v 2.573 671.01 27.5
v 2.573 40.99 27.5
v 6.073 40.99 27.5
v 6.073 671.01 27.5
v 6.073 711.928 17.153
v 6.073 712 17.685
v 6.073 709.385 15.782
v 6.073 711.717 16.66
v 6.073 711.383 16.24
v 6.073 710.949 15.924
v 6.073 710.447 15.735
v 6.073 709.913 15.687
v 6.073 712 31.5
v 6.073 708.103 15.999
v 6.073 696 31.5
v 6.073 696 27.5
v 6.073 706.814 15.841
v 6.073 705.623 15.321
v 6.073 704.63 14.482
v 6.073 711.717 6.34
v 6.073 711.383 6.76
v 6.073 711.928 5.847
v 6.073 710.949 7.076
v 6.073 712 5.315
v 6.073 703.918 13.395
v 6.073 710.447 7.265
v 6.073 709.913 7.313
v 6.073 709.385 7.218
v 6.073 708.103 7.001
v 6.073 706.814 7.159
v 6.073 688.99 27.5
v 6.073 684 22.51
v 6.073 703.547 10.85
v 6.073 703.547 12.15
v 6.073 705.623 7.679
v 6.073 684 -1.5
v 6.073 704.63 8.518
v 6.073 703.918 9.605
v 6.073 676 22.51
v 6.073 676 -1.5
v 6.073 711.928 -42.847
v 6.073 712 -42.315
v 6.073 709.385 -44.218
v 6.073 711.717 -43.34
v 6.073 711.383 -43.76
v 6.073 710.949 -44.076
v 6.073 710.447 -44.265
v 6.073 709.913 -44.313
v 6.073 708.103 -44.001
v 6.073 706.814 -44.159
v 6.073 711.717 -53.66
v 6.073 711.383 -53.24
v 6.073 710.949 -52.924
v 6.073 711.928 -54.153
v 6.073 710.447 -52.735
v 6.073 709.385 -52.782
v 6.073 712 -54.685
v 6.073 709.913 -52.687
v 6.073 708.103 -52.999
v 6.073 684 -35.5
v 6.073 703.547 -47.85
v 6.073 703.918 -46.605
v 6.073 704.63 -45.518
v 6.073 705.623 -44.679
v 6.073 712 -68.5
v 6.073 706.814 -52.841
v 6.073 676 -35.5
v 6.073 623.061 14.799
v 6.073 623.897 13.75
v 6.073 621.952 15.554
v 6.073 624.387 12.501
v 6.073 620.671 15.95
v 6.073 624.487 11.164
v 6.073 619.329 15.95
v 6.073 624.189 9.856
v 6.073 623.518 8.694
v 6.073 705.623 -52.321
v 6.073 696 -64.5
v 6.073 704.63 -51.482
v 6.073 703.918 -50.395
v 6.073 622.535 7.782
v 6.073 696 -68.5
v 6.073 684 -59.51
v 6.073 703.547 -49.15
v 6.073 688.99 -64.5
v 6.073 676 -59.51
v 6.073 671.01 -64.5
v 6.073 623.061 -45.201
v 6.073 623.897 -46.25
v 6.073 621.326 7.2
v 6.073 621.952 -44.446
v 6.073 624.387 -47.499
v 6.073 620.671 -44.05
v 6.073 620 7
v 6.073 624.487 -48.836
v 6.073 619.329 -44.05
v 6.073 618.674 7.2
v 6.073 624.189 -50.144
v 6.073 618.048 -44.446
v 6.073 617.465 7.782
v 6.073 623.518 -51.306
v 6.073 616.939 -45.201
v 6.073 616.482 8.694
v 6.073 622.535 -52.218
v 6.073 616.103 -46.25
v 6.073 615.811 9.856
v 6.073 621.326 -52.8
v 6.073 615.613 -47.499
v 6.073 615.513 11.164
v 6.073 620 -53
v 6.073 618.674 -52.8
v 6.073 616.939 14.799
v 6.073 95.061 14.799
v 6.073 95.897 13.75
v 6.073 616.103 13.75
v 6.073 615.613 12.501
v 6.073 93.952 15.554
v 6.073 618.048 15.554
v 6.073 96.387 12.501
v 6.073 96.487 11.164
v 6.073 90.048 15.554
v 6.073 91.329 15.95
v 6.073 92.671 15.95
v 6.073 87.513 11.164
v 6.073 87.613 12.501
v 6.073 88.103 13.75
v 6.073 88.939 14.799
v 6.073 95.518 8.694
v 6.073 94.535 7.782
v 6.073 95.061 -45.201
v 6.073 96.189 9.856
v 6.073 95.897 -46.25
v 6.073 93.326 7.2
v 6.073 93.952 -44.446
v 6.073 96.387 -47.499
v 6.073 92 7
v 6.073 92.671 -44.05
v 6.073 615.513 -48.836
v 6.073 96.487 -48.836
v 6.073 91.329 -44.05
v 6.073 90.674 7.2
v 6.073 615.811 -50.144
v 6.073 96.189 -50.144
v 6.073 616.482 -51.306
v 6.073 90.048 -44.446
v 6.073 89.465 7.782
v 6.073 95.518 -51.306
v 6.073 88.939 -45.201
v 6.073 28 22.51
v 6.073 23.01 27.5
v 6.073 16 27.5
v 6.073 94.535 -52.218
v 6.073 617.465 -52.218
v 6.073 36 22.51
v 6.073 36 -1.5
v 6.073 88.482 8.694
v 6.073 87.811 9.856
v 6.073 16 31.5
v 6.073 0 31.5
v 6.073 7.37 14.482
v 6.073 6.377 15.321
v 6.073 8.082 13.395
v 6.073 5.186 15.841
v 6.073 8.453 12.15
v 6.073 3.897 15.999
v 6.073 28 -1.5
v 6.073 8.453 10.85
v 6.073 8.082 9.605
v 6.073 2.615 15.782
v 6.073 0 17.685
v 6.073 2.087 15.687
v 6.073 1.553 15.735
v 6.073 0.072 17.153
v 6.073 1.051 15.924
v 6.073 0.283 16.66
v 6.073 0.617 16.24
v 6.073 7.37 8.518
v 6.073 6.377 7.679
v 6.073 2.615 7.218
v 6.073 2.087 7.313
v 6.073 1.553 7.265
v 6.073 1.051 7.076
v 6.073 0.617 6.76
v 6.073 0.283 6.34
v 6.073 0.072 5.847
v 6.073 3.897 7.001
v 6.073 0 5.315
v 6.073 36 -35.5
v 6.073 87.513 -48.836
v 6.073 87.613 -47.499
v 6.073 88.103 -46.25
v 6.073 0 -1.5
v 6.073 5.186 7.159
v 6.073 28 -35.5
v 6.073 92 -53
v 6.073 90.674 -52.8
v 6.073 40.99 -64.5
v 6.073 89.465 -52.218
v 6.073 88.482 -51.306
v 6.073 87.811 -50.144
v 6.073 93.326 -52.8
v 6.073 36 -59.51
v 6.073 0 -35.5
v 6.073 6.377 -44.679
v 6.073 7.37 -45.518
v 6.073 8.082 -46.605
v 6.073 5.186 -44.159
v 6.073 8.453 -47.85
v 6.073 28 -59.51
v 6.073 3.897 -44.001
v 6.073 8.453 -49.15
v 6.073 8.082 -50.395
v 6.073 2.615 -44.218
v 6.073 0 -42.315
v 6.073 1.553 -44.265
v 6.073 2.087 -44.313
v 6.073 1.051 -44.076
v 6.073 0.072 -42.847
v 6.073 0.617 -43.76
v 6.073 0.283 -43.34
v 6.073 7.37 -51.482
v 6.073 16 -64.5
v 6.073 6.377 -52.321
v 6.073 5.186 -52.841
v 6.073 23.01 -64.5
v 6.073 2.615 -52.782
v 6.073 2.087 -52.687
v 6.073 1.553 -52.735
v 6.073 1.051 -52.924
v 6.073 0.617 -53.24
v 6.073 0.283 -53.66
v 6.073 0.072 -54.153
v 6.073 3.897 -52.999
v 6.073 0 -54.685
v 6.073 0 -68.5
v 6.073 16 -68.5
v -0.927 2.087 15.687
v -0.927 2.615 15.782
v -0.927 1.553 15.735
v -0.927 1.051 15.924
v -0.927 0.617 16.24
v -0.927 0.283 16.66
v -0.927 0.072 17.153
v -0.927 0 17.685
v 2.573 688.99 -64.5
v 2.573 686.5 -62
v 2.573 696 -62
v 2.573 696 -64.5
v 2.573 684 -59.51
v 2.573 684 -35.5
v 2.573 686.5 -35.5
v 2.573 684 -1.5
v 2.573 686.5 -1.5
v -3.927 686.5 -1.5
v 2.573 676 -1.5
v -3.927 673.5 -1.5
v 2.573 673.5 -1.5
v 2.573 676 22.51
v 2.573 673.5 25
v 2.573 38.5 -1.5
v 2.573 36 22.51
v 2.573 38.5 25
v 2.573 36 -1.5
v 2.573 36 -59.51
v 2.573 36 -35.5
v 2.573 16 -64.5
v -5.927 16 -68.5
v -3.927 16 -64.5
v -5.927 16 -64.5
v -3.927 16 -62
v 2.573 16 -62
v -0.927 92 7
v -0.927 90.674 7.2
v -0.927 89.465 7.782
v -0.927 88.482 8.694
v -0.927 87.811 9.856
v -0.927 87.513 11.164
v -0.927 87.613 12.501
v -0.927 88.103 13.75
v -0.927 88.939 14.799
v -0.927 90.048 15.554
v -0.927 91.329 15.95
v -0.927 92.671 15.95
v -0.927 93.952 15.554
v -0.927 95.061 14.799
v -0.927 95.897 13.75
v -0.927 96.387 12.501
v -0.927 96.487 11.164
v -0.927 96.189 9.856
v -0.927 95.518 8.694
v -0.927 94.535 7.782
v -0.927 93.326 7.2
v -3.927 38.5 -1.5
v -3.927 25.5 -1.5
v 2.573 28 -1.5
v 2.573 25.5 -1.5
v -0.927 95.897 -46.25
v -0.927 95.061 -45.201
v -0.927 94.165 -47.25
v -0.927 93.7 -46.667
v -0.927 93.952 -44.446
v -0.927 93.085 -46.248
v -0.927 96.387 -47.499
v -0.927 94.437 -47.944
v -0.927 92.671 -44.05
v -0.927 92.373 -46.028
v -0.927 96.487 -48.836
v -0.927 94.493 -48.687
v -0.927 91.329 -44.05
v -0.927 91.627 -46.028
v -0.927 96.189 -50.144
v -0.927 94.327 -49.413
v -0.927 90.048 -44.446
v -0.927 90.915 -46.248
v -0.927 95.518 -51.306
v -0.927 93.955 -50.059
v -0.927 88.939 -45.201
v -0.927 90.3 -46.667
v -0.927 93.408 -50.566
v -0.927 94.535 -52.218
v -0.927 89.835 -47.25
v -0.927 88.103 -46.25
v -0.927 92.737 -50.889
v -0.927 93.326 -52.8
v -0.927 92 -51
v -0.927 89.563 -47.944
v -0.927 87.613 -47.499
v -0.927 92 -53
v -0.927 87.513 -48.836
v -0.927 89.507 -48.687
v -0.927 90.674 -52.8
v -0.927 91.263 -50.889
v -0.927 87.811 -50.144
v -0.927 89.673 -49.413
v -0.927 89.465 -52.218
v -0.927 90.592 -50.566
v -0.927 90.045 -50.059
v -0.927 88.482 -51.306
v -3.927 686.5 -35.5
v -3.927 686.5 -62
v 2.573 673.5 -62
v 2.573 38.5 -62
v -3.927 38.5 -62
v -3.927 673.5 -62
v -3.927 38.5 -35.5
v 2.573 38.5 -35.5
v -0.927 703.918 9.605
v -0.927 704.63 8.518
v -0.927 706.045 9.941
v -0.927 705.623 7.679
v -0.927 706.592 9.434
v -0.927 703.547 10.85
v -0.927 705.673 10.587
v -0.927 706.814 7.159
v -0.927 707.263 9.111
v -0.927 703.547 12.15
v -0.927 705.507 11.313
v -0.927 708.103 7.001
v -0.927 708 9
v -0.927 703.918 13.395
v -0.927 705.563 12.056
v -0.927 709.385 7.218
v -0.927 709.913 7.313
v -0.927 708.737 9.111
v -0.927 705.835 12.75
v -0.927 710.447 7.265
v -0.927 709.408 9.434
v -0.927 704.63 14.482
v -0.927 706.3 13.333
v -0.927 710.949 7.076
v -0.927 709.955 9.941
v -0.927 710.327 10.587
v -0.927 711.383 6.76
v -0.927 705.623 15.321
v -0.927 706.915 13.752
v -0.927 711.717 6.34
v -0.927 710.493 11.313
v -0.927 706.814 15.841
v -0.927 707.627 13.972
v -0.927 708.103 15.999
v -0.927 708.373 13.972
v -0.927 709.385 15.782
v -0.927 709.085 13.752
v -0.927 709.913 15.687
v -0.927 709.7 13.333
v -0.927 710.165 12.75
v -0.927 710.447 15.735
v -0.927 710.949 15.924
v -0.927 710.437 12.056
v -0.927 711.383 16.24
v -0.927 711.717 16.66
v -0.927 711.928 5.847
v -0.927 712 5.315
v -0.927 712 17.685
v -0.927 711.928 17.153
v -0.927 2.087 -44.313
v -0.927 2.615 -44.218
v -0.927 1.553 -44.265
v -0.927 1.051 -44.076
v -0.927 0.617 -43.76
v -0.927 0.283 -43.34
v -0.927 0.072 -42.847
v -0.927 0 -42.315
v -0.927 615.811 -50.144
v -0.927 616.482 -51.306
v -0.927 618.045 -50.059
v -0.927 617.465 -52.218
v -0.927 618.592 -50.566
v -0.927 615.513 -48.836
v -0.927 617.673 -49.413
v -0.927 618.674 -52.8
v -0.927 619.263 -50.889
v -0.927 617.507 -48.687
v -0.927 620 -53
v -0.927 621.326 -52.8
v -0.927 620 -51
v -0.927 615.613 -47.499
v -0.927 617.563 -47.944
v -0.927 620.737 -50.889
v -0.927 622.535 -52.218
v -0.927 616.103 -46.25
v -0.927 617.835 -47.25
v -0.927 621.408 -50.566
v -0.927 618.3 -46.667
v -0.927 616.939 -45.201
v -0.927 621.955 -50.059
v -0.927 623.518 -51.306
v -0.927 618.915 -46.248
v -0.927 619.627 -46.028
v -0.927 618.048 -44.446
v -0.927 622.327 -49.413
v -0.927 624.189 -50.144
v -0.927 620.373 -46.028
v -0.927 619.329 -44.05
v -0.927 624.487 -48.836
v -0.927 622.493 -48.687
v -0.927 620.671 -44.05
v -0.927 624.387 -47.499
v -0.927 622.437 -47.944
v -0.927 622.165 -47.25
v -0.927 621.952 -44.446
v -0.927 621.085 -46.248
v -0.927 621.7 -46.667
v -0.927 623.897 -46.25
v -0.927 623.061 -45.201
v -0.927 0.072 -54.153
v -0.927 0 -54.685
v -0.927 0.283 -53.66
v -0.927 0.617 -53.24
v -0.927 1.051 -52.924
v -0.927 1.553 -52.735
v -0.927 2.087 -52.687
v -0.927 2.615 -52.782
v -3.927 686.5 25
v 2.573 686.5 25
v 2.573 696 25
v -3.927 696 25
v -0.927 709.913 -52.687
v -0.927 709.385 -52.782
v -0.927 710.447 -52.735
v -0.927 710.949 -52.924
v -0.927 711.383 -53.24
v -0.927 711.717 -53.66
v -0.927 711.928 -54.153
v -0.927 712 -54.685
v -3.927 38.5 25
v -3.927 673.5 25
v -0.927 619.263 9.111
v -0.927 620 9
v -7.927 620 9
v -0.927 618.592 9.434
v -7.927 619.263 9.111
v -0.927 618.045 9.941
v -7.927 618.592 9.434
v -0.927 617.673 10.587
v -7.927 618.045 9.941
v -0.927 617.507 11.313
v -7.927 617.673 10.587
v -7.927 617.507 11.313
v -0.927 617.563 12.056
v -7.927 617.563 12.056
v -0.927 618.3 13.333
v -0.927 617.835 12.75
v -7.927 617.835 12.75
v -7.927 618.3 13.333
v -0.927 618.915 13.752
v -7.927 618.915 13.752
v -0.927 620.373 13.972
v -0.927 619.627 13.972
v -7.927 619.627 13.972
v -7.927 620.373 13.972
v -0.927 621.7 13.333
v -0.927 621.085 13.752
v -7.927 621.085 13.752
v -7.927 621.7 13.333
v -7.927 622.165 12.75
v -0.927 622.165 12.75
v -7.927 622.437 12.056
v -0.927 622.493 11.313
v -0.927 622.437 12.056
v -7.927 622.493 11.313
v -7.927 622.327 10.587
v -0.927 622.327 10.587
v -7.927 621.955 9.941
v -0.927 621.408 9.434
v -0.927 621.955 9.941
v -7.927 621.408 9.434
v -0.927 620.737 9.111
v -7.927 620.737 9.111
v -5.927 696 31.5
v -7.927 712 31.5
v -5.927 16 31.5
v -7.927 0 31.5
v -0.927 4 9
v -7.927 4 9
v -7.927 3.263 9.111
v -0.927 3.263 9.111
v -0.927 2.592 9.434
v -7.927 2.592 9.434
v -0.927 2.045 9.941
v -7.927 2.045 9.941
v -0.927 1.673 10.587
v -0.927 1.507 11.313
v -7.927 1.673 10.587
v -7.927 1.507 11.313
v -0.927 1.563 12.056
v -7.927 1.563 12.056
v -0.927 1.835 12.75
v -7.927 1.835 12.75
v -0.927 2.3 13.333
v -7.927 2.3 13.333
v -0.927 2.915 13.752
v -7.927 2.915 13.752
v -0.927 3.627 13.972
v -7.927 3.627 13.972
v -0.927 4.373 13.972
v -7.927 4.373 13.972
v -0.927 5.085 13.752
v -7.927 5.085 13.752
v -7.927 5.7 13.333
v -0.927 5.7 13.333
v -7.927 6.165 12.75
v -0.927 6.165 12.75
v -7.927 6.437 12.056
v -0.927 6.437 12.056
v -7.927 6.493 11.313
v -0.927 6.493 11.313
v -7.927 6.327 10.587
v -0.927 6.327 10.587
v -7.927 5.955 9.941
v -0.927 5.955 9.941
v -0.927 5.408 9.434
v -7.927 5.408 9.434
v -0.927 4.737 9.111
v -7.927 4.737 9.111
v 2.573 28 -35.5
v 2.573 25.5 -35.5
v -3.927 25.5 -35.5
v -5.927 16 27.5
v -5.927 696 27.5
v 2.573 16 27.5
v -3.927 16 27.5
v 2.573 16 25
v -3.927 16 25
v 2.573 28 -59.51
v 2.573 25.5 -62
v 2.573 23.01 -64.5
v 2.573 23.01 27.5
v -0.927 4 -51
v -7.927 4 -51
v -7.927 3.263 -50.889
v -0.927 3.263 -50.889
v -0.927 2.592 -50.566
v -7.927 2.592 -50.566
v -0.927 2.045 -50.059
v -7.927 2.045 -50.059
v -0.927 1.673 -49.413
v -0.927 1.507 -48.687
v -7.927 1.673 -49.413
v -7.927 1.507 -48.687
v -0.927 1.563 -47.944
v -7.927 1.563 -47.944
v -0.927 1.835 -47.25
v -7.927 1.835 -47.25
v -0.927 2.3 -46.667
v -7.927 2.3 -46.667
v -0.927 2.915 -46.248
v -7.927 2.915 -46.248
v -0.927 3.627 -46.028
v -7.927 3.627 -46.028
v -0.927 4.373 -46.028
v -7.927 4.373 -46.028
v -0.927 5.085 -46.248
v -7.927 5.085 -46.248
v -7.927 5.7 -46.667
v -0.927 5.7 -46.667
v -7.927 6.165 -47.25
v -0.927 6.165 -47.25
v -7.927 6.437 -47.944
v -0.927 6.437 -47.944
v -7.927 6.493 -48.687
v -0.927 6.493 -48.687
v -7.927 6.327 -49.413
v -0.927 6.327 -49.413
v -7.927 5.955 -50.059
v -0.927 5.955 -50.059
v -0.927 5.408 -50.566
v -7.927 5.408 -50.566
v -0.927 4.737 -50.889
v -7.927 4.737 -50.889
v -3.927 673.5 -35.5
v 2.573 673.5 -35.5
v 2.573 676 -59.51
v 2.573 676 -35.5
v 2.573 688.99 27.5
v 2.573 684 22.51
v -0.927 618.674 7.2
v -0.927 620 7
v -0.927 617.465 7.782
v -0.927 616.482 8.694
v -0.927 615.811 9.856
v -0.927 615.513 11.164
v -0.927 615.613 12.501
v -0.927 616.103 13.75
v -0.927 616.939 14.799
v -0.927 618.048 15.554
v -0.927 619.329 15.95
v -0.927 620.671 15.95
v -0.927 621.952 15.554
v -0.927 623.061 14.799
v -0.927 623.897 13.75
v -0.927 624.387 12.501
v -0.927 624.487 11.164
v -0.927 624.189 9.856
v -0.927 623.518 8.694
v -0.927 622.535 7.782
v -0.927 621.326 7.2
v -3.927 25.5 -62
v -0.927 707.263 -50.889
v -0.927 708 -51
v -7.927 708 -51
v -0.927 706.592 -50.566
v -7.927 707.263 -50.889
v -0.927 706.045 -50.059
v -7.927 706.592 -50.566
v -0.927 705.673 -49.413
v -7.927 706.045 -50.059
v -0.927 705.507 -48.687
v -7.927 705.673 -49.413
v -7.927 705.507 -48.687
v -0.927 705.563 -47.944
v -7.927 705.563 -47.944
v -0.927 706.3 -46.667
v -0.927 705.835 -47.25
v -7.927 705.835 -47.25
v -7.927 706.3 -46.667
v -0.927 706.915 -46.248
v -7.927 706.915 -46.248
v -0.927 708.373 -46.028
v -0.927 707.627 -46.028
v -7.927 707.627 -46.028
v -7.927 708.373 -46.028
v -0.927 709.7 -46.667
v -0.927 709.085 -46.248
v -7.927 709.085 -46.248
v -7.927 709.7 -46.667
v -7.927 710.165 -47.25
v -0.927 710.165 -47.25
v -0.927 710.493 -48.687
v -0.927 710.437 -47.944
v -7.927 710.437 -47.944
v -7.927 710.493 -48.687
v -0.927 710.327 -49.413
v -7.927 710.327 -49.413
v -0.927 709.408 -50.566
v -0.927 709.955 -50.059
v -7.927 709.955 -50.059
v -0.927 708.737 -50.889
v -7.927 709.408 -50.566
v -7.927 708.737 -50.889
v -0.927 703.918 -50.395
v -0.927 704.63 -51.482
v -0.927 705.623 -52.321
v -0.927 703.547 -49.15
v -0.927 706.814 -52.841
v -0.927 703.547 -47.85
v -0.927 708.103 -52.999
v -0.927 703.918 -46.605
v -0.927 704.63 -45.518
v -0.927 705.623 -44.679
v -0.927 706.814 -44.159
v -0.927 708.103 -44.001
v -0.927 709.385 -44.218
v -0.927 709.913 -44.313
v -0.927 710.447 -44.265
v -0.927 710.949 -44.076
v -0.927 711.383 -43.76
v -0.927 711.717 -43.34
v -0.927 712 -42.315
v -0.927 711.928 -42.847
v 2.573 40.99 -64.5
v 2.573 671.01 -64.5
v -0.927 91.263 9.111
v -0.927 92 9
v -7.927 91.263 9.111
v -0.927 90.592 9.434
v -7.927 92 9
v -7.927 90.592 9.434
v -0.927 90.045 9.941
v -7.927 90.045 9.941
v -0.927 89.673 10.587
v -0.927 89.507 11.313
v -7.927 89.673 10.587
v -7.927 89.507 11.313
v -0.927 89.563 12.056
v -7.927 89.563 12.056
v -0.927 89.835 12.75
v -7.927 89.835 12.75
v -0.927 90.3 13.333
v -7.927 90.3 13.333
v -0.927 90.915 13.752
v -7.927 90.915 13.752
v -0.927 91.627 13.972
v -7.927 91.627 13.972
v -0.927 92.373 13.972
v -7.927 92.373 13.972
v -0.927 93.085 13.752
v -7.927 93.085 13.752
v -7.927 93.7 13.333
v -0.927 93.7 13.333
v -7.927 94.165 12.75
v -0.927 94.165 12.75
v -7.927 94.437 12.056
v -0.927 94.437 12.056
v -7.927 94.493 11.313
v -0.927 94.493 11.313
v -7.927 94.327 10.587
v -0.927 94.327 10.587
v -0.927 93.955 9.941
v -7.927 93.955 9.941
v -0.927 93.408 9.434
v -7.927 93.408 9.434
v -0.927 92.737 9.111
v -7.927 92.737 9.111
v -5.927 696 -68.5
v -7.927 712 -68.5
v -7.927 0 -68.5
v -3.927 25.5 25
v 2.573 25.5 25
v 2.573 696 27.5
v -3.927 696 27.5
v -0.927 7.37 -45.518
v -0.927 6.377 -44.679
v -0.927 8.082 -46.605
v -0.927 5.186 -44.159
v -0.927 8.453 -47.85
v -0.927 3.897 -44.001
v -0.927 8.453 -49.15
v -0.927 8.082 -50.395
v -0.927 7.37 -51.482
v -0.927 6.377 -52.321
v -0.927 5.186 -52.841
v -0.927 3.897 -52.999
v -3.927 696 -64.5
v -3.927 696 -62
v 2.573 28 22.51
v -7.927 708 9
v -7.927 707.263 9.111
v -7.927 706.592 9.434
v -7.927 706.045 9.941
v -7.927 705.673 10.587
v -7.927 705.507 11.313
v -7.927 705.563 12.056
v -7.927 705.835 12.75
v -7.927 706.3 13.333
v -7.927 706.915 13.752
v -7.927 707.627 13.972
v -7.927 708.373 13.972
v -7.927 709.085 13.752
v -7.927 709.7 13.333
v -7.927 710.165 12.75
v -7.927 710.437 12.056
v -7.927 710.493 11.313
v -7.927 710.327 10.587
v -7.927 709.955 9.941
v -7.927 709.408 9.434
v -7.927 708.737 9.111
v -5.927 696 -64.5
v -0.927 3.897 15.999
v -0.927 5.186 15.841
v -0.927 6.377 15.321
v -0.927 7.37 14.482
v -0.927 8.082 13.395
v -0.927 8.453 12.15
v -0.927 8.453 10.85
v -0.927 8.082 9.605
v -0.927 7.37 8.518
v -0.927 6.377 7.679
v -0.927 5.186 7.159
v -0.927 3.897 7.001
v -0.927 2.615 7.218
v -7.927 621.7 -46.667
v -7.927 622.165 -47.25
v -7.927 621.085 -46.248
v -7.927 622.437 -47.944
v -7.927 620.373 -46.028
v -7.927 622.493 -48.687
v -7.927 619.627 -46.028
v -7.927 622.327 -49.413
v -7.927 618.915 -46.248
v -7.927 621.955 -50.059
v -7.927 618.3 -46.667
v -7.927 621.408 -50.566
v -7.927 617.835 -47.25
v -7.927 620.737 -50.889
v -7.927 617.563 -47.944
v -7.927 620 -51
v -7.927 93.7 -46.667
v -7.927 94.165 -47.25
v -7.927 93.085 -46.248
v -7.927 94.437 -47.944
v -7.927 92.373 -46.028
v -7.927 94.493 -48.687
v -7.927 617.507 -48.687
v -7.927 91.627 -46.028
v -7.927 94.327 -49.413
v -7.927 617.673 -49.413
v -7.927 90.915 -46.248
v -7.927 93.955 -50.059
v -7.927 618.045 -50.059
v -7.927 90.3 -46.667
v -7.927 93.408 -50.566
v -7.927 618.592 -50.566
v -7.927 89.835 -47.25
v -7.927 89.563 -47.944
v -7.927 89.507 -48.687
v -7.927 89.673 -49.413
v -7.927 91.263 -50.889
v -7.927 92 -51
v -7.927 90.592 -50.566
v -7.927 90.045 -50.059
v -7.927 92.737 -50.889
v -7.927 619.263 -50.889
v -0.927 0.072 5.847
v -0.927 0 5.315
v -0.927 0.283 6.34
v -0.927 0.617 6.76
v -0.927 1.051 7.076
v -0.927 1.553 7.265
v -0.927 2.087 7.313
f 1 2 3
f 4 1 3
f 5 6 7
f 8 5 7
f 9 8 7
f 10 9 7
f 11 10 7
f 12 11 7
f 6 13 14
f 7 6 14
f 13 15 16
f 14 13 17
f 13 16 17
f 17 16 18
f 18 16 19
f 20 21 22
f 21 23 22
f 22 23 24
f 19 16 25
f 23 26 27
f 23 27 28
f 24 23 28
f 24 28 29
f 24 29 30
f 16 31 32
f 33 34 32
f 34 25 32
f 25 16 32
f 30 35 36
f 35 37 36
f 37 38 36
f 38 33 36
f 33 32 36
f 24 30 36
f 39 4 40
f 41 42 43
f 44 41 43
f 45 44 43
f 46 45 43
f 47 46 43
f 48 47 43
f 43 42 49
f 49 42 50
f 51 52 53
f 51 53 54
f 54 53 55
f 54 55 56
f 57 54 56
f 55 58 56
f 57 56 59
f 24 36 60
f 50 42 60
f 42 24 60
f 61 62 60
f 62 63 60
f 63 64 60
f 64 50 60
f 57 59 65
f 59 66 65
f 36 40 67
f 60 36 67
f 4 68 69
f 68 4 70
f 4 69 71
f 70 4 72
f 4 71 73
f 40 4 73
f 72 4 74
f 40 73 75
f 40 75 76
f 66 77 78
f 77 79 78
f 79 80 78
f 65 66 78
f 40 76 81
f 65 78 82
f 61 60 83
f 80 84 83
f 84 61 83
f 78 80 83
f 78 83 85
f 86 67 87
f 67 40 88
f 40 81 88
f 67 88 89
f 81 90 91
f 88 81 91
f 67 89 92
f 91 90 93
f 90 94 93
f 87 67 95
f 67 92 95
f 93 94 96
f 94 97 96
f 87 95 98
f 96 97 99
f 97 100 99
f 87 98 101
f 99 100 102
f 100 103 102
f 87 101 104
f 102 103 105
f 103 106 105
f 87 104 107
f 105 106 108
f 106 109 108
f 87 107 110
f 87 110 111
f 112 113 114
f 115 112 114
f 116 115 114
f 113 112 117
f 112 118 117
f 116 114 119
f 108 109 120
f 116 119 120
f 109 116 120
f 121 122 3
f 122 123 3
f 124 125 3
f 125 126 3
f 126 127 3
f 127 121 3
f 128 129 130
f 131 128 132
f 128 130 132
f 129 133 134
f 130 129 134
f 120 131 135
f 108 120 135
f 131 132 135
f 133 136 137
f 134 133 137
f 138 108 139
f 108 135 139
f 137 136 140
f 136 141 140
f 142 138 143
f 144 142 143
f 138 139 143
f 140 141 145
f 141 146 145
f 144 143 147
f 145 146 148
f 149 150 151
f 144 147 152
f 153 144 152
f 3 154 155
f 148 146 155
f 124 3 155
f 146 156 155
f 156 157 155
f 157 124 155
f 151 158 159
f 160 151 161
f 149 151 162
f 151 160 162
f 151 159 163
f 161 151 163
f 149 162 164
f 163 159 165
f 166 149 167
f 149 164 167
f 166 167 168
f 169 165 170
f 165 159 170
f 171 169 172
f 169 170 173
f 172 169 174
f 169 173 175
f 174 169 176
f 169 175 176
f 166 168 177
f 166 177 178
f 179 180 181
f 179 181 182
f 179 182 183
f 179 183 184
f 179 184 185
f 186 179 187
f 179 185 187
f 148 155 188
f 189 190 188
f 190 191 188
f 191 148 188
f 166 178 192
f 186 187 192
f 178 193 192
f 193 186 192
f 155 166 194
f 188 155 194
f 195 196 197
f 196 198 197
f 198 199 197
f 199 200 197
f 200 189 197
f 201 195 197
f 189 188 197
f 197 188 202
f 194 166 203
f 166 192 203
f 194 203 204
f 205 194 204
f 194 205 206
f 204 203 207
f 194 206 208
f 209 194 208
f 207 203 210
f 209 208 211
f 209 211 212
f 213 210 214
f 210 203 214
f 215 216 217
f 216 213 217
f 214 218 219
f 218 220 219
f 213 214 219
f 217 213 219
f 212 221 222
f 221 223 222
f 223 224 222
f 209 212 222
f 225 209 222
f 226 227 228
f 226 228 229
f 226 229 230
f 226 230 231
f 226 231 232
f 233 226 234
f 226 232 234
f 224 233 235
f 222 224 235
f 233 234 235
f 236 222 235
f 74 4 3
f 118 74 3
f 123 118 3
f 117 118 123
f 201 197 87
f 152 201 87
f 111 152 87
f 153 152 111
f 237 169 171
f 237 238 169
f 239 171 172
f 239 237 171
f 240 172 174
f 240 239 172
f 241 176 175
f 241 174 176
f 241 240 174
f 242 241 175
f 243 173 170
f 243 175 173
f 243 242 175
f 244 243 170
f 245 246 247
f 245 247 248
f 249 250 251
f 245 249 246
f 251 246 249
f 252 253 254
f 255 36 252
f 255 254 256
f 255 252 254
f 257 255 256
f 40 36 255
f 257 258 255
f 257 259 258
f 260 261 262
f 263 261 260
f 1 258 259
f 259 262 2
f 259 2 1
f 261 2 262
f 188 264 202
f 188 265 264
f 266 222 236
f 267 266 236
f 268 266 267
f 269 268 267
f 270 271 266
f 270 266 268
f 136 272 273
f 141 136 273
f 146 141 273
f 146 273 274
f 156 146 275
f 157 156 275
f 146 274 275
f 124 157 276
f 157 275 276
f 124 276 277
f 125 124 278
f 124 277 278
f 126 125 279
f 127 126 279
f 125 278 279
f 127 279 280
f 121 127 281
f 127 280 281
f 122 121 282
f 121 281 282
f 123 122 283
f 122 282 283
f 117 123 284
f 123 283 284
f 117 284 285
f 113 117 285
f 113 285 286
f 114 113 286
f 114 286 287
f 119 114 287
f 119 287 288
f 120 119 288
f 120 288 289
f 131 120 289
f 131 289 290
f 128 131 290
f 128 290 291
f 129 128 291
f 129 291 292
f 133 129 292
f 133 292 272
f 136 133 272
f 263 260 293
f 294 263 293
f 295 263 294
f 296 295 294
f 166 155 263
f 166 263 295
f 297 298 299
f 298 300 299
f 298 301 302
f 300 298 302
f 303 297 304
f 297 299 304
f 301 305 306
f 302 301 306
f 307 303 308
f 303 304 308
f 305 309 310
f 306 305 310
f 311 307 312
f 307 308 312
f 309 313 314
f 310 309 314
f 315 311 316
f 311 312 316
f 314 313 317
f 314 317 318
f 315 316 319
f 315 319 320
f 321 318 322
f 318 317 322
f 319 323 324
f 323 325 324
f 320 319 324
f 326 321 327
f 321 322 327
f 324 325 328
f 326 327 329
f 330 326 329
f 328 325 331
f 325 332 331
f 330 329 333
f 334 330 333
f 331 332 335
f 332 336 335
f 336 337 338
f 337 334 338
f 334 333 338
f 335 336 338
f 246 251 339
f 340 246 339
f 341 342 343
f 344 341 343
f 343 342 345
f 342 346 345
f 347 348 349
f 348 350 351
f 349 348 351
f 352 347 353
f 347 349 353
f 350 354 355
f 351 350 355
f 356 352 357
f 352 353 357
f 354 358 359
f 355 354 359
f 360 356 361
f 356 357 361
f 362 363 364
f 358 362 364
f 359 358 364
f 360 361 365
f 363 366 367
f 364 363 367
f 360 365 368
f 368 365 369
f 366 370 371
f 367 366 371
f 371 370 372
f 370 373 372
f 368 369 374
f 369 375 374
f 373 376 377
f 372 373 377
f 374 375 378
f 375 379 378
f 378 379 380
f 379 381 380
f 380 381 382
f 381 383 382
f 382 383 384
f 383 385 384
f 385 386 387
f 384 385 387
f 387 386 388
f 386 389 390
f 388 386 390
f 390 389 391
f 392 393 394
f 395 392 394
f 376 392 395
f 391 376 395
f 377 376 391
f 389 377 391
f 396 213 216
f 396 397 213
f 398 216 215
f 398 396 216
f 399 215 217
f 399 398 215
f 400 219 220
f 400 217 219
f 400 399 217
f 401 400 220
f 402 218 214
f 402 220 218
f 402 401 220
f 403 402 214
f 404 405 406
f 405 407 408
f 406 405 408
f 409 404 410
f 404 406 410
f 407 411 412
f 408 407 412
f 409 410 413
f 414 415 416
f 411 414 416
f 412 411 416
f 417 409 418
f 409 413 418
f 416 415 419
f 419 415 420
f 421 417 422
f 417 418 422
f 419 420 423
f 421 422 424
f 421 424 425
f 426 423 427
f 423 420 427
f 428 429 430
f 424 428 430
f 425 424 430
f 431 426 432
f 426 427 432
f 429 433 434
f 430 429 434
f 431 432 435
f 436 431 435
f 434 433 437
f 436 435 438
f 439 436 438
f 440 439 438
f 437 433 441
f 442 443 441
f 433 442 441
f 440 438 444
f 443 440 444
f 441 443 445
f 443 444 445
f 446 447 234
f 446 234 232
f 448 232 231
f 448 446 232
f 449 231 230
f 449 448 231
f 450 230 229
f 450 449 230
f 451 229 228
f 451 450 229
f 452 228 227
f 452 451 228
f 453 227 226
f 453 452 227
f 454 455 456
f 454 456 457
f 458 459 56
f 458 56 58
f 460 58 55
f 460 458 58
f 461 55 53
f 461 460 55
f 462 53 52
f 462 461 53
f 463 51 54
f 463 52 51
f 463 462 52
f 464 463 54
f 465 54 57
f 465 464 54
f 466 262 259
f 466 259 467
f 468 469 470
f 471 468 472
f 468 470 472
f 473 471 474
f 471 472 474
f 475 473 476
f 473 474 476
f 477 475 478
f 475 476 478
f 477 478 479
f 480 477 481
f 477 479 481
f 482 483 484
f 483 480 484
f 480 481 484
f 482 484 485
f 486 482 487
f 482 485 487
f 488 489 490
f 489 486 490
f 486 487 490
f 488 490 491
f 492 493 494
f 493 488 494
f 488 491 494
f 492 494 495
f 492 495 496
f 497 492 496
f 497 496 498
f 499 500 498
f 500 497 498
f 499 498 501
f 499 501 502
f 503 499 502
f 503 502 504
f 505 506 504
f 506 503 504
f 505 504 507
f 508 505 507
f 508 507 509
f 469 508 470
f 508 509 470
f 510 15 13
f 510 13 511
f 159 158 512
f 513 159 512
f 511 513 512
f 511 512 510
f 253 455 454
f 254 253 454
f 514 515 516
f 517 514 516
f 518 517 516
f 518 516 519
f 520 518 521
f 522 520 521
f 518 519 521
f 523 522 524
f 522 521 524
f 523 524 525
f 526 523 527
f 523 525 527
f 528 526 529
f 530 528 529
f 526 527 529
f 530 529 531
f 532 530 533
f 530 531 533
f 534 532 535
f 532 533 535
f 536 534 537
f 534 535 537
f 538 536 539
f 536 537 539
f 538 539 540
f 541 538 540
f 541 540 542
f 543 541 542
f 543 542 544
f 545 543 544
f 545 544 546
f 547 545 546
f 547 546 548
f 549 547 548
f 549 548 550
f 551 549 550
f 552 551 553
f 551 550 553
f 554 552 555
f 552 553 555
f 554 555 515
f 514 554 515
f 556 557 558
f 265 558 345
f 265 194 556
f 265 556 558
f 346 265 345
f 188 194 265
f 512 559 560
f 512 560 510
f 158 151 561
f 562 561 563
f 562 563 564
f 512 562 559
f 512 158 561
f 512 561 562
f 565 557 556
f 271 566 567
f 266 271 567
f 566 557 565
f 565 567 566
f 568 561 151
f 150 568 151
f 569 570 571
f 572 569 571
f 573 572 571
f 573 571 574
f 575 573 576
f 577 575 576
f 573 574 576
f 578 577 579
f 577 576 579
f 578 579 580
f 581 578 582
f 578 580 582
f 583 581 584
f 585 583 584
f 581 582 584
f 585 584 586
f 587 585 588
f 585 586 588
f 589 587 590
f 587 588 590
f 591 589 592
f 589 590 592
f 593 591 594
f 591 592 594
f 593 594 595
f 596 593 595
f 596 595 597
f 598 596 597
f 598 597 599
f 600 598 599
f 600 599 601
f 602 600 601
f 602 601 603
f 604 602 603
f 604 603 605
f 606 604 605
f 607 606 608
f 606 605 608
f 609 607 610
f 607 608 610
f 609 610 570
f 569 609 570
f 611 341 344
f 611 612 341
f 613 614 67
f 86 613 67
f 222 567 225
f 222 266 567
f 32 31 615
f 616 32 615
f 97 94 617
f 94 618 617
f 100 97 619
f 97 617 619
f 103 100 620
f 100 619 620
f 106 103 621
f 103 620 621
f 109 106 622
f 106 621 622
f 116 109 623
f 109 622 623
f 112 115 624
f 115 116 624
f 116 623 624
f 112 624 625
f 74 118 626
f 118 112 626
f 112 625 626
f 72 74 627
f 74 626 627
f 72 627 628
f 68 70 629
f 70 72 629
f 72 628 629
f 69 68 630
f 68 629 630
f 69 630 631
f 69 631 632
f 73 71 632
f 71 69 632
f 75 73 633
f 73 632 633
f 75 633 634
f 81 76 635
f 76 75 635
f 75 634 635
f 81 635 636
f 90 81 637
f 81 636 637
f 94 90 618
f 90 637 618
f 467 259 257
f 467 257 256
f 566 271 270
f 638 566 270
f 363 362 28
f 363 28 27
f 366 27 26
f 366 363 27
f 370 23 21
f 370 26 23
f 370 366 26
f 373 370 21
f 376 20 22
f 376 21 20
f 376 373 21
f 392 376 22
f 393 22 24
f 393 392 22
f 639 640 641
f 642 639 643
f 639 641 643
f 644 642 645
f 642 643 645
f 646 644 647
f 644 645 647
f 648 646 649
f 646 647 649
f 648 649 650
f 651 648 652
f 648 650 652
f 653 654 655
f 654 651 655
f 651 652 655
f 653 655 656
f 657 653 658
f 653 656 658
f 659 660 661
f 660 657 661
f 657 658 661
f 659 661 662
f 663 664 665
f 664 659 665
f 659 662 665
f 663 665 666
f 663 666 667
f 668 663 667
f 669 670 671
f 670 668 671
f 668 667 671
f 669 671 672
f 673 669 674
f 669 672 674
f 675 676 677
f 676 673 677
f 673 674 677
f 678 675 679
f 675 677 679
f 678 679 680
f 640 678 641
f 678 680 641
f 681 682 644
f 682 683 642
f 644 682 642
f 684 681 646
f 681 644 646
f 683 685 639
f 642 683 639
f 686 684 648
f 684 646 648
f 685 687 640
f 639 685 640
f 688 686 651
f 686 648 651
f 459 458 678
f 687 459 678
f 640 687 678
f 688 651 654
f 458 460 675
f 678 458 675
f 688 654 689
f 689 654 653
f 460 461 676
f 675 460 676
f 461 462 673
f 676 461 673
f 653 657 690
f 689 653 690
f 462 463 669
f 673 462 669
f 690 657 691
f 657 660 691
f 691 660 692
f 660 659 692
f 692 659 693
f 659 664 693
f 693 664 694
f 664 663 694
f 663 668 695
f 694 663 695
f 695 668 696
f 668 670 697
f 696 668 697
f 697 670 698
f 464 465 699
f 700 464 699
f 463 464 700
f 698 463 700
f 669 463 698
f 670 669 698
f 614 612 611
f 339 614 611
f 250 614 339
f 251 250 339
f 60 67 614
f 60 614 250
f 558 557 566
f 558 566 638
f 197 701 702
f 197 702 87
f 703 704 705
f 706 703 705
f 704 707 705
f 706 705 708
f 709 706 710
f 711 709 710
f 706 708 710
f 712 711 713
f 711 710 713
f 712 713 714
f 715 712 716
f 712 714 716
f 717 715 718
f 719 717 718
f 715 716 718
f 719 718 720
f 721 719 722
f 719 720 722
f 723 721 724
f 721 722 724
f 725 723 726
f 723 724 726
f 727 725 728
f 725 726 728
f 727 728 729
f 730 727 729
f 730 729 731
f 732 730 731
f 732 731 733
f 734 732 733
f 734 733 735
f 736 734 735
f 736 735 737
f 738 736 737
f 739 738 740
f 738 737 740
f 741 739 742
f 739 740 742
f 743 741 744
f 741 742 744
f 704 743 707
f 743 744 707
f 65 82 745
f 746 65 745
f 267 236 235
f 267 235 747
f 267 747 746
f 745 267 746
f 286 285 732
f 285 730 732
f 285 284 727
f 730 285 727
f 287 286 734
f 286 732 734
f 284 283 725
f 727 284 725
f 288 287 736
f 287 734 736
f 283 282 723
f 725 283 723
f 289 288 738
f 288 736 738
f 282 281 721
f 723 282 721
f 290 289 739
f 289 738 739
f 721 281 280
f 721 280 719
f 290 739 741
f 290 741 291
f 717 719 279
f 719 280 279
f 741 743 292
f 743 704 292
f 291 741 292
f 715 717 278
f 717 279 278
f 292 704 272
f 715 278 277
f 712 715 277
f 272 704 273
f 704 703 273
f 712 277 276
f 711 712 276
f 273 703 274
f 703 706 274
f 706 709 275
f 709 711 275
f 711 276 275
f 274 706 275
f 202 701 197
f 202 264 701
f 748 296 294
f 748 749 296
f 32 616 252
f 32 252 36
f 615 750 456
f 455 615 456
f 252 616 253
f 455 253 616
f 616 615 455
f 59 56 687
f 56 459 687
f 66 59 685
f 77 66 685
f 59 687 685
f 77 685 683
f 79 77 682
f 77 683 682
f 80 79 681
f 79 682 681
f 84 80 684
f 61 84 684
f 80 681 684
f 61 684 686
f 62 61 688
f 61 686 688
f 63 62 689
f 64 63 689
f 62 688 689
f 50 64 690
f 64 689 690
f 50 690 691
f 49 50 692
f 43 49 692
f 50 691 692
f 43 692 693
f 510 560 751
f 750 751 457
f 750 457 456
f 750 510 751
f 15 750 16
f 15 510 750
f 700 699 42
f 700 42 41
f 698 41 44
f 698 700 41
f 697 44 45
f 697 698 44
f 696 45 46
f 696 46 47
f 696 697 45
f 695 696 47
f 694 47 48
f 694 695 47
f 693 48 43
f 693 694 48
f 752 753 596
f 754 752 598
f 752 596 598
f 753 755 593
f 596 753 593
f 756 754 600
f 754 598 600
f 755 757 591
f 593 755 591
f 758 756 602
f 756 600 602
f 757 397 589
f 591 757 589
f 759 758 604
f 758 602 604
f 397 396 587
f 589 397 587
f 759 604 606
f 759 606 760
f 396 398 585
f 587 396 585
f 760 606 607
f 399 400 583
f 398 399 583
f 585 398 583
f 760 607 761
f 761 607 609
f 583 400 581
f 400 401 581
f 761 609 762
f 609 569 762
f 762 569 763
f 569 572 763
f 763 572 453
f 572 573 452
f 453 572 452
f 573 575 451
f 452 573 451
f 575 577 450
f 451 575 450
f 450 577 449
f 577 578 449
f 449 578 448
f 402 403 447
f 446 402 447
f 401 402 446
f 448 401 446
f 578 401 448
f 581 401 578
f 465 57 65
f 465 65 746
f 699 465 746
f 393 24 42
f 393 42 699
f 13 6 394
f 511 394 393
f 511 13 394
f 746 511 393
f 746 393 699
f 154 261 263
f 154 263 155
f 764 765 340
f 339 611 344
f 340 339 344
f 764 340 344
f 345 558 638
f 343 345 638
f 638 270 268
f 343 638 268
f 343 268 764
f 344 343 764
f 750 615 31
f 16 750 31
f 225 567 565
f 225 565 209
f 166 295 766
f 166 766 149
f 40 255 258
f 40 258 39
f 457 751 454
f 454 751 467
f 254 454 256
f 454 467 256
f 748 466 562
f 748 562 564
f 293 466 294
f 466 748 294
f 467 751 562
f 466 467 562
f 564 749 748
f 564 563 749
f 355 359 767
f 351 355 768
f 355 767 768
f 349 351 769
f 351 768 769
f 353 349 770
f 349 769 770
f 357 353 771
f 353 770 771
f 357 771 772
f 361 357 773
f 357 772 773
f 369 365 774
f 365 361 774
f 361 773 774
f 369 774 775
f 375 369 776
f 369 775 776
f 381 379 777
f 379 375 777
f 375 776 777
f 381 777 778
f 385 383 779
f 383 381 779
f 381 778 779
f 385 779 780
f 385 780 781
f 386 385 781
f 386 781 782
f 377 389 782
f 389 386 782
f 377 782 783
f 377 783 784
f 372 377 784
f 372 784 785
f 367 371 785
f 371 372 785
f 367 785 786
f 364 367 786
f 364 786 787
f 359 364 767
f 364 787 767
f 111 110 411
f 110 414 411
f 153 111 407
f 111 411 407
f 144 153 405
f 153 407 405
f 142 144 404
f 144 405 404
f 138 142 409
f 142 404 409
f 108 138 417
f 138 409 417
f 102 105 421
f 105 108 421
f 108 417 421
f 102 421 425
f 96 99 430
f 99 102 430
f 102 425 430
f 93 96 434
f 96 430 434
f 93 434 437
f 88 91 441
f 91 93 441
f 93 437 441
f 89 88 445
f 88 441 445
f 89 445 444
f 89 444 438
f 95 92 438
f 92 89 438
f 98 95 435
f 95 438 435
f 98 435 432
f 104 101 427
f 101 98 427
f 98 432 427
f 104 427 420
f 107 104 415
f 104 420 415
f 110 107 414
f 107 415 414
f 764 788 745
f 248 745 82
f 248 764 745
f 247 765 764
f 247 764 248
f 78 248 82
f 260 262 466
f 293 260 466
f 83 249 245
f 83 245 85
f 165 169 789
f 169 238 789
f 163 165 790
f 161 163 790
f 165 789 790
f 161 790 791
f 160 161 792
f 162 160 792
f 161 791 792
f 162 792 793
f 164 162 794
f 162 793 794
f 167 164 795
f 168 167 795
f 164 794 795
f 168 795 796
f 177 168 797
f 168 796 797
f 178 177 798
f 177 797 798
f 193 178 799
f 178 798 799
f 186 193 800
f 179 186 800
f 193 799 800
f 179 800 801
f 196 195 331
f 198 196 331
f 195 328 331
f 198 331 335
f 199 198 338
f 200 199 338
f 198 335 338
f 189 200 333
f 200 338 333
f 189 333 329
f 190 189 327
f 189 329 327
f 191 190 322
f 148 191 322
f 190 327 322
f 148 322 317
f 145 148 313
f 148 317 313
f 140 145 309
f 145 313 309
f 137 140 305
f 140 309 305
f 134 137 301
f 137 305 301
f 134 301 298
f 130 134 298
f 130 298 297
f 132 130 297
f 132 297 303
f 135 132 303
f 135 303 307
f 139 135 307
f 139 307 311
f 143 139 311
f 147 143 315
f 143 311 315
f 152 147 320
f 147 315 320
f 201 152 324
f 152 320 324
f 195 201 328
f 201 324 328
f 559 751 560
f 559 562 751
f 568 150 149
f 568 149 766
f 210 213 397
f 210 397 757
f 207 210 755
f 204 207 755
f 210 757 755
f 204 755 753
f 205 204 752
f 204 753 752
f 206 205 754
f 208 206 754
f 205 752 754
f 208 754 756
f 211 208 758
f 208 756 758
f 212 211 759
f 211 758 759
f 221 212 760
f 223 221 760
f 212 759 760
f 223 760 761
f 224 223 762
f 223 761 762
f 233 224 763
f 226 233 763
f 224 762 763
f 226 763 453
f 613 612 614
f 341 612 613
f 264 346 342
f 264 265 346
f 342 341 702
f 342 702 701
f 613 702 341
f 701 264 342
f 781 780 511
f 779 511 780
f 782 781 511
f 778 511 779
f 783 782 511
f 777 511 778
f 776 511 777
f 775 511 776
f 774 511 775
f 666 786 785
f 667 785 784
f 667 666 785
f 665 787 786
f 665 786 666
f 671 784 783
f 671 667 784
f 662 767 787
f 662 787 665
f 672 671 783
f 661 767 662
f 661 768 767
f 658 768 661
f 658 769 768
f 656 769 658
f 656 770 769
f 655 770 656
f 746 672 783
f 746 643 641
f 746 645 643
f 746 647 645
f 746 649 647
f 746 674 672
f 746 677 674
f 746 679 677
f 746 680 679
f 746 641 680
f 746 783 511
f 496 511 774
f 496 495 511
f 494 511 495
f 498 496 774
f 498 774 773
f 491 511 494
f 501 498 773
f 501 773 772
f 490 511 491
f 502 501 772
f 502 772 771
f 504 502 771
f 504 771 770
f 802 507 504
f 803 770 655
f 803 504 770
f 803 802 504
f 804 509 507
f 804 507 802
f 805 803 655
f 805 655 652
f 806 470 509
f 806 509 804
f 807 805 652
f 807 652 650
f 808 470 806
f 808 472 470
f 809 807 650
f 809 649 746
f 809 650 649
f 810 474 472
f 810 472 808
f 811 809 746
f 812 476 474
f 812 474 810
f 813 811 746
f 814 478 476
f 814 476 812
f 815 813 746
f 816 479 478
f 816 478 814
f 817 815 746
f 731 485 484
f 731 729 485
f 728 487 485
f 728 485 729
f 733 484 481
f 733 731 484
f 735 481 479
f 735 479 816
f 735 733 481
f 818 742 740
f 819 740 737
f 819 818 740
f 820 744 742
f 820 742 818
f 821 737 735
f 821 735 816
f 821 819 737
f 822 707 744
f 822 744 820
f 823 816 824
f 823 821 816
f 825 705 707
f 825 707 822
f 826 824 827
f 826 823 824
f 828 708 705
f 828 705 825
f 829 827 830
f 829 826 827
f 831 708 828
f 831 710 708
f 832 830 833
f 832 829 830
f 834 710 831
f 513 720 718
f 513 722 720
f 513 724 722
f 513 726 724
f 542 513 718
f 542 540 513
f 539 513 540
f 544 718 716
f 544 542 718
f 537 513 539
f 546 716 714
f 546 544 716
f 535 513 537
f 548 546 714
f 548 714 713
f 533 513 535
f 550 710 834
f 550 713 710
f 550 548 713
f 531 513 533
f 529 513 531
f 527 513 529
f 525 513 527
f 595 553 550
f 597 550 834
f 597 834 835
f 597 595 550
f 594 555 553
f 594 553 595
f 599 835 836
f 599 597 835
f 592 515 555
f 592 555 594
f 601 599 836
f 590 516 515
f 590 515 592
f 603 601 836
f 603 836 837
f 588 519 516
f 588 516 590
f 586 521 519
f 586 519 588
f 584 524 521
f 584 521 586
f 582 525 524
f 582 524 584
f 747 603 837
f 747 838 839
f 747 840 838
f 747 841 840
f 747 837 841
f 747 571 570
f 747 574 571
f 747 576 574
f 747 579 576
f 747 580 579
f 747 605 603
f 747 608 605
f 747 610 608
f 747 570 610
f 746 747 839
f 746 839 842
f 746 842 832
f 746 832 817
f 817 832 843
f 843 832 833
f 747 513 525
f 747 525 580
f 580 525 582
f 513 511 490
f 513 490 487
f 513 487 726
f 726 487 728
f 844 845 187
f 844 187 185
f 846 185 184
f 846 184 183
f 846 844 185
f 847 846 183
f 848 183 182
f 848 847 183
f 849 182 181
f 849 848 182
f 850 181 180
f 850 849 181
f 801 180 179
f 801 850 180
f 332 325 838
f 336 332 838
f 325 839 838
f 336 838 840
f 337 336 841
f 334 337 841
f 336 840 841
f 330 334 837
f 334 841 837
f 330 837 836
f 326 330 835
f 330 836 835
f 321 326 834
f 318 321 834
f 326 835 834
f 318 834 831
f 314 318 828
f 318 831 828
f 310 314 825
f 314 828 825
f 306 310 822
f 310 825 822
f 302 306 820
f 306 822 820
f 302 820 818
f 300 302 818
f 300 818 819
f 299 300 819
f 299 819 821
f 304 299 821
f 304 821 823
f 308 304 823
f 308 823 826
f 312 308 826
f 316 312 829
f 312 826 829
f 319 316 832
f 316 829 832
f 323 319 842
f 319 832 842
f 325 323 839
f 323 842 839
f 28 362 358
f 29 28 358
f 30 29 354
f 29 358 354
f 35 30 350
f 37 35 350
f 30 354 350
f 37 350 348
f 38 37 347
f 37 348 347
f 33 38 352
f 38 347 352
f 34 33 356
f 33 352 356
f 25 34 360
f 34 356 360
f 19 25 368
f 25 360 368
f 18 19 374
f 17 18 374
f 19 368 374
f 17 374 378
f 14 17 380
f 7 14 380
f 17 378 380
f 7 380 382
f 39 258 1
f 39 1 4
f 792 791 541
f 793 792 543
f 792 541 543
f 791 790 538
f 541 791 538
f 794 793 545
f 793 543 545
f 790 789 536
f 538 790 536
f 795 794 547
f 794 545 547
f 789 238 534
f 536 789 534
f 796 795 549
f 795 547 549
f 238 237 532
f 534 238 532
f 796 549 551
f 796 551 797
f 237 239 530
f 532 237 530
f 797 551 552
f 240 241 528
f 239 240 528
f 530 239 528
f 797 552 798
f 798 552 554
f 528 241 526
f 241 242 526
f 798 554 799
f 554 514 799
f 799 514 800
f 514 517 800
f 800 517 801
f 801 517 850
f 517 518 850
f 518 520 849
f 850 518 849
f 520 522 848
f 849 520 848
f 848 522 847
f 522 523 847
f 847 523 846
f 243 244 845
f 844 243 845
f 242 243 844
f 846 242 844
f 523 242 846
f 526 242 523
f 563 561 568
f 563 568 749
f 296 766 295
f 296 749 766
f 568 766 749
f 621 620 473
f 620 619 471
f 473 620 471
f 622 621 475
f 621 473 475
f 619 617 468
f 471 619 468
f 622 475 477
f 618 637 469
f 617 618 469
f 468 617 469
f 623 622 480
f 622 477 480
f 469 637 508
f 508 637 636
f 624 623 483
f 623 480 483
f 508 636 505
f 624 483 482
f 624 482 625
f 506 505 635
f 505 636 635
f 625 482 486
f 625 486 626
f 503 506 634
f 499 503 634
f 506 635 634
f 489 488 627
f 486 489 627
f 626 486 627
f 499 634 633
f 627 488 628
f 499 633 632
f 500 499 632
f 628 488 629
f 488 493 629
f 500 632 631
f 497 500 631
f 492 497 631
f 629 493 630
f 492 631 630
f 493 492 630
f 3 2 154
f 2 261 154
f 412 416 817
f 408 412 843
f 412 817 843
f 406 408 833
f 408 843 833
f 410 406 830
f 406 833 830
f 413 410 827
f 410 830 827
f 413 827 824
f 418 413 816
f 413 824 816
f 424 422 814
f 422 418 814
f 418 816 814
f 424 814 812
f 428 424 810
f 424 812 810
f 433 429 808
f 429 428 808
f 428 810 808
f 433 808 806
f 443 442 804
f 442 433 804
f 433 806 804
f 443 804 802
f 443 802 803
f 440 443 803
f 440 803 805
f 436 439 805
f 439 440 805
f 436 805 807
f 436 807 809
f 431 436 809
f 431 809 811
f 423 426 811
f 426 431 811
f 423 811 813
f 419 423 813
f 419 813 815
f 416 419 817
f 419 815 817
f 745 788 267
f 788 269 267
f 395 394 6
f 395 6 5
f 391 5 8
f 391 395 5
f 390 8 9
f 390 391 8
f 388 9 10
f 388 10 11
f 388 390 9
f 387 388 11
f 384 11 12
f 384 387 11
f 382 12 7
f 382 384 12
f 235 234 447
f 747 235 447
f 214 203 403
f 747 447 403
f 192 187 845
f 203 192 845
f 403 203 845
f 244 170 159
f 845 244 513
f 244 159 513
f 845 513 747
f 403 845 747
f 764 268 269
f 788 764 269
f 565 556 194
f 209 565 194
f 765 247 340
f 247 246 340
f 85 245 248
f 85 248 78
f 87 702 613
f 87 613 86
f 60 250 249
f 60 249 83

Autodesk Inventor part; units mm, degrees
ref_plane "YZ Plane" through (0, 0, 0) normal (1, 0, 0) x (0, 1, 0)
ref_plane "XZ Plane" through (0, 0, 0) normal (0, 1, 0) x (-1, 0, 0)
ref_plane "XY Plane" through (0, 0, 0) normal (0, 0, 1) x (1, 0, 0)
sketch "Эскиз1" plane through (0, 0, 0) normal (0, 1, 0) x (-1, 0, 0)
  line L0 (-6.0731, 25) -> (3.9269, 25)
  line L1 (-6.0731, -62) -> (-6.0731, 25)
  line L2 (3.9269, 31.5) -> (7.9269, 31.5)
  line L3 (7.9269, 31.5) -> (7.9269, -68.5)
  line L4 (3.9269, 25) -> (3.9269, 31.5)
  line L5 (-6.0731, 25) -> (-2.5731, 25)
  line L6 (-2.5731, 25) -> (-2.5731, 27.5)
  line L7 (-2.5731, 27.5) -> (-6.0731, 27.5)
  line L8 (-6.0731, 27.5) -> (-6.0731, 25)
  line L9 (3.9269, 27.5) -> (5.9269, 27.5)
  line L10 (5.9269, 27.5) -> (5.9269, 31.5)
  line L11 (5.9269, 31.5) -> (3.9269, 31.5)
  line L12 (3.9269, 31.5) -> (3.9269, 27.5)
  line L13 (7.9269, -18.5) -> (10, -18.5)
  line L14 (-6.0731, -62) -> (3.9269, -62)
  line L15 (3.9269, -68.5) -> (7.9269, -68.5)
  line L16 (3.9269, -62) -> (3.9269, -68.5)
  line L17 (-6.0731, -62) -> (-2.5731, -62)
  line L18 (-2.5731, -62) -> (-2.5731, -64.5)
  line L19 (-2.5731, -64.5) -> (-6.0731, -64.5)
  line L20 (-6.0731, -64.5) -> (-6.0731, -62)
  line L21 (3.9269, -64.5) -> (5.9269, -64.5)
  line L22 (5.9269, -64.5) -> (5.9269, -68.5)
  line L23 (5.9269, -68.5) -> (3.9269, -68.5)
  line L24 (3.9269, -68.5) -> (3.9269, -64.5)
  point P0 (0, 0)
  point P1 (-2.5731, 25)
  dimension "d0" = 14
  dimension "d1" = 6.5
  dimension "d2" = 6.5
  dimension "d3" = 2.5
  dimension "d4" = 4
  dimension "d5" = 2
  dimension "d6" = 100
  dimension "d7" = 50
extrude "Выдавливание1" add sketch "Эскиз1" along normal blind 712 contours L8 L7 L6 L0 | L0 L4 L9 L10 L2 L3 L15 L22 L21 L16 L14 L1 | L14 L18 L19 L20
sketch "Эскиз5" plane through (-5.9269, 0, 31.5) normal (0, 0, 1) x (1, 0, 0)
  line L0 (-2, 0) -> (12, 0)
  line L1 (12, 0) -> (12, 16)
  line L2 (12, 16) -> (-2, 16)
  line L3 (-2, 16) -> (-2, 0)
  line L4 (-2, 0) -> (-2, 712) projected
  line L5 (12, 712) -> (8.5, 712) projected
  line L6 (12, 712) -> (-2, 712)
  line L7 (-2, 712) -> (-2, 696)
  line L8 (-2, 696) -> (12, 696)
  line L9 (12, 696) -> (12, 712)
  point P0 (5.9269, 0)
  dimension "d18" = 16
  dimension "d19" = 0
  dimension "d20" = 16
extrude "Выдавливание3" add sketch "Эскиз5" against normal blind 100
sketch "Эскиз6" plane through (-7.9269, 0, 31.5) normal (0, 0, 1) x (1, 0, 0)
  line L0 (14, 25.5) -> (4, 25.5)
  line L1 (14, 25.5) -> (10.5, 25.5)
  line L2 (10.5, 25.5) -> (10.5, 28)
  line L3 (10.5, 28) -> (14, 28)
  line L4 (14, 28) -> (14, 25.5)
  line L5 (4, 32) -> (0, 32)
  line L6 (2, 28) -> (2, 32)
  line L7 (2, 32) -> (4, 32)
  line L8 (4, 32) -> (4, 28)
  line L9 (4, 25.5) -> (4, 32)
  line L10 (4, 28) -> (2, 28)
  line L11 (14, 38.5) -> (4, 38.5)
  line L12 (14, 38.5) -> (10.5, 38.5)
  line L13 (10.5, 36) -> (14, 36)
  line L14 (14, 36) -> (14, 38.5)
  line L15 (10.5, 38.5) -> (10.5, 36)
  line L16 (4, 36) -> (2, 36)
  line L17 (2, 36) -> (2, 32)
  line L18 (4, 32) -> (4, 36)
  line L19 (4, 38.5) -> (4, 32)
  line L20 (14, 36) -> (14, 28)
  line L21 (14, 16) -> (14, 696) projected
  line L22 (14, 356) -> (16, 356)
  line L23 (0, 0) -> (14, 0) projected
  line L24 (14, 686.5) -> (4, 686.5)
  line L25 (14, 686.5) -> (10.5, 686.5)
  line L26 (10.5, 684) -> (14, 684)
  line L27 (14, 684) -> (14, 686.5)
  line L28 (10.5, 686.5) -> (10.5, 684)
  line L29 (4, 684) -> (2, 684)
  line L30 (4, 680) -> (0, 680)
  line L31 (2, 684) -> (2, 680)
  line L32 (2, 680) -> (4, 680)
  line L33 (4, 680) -> (4, 684)
  line L34 (4, 686.5) -> (4, 680)
  line L35 (14, 673.5) -> (4, 673.5)
  line L36 (14, 673.5) -> (10.5, 673.5)
  line L37 (10.5, 676) -> (14, 676)
  line L38 (14, 676) -> (14, 673.5)
  line L39 (10.5, 673.5) -> (10.5, 676)
  line L40 (4, 676) -> (2, 676)
  line L41 (2, 676) -> (2, 680)
  line L42 (4, 680) -> (4, 676)
  line L43 (4, 673.5) -> (4, 680)
  line L44 (14, 676) -> (14, 684)
  point P0 (7.9269, 0)
  dimension "d26" = 356
extrude "Выдавливание4" cut sketch "Эскиз6" against normal blind 100 contours L0 L9 L8 L18 L19 L11 L15 L13 L20 L3 L2 | L37 L39 L35 L43 L42 L33 L34 L24 L28 L26 L21
chamfer "Фаска2" distance 4.99 angle 45 8 edges at (4.3231, 684, 27.5) (4.3231, 676, 27.5) (4.3231, 36, 27.5) (4.3231, 28, 27.5) (4.3231, 36, -64.5) (4.3231, 28, -64.5) (4.3231, 684, -64.5) (4.3231, 676, -64.5)
sketch "Эскиз7" plane through (6.0731, 40.99, 27.5) normal (1, 0, 0) x (0, 0, -1)
  circle A0 centre (76, 51.01) radius 2.5
  circle A1 centre (16, 51.01) radius 2.5
  line L0 (-4, -24.99) -> (-4, 655.01) projected
  line L1 (96, -24.99) -> (96, 655.01) projected
  line L2 (-4, -40.99) -> (96, -40.99) projected
  circle A2 centre (76, -36.99) radius 2.5
  circle A3 centre (16, -36.99) radius 2.5
  point P0 (27.5, -40.99)
  dimension "d32" = 5
  dimension "d33" = 20
  dimension "d34" = 20
  dimension "d35" = 5
  dimension "d36" = 92
  dimension "d37" = 92
  dimension "d38" = 5
  dimension "d39" = 5
  dimension "d40" = 4
  dimension "d41" = 4
ref_plane "РабПлоскость1" through (0, 356, 0) normal (0, -1, 0) x (1, 0, 0)
hole "Отверстие1" at (6.0731, 4, 11.5) at (6.0731, 4, -48.5) at (6.0731, 92, -48.5) at (6.0731, 92, 11.5) direction (-1, 0, 0) diameter 5 end through all counterbore diameter 9 counterbore depth 7
mirror "Зеркальное отражение1" about plane through (0, 356, 0) normal (0, -1, 0) of "Отверстие1"
fillet "Сопряжение2" radius 2 8 edges at (2.5731, 0, -50.5616) (2.5731, 0, -46.4384) (2.5731, 0, 9.4384) (2.5731, 0, 13.5616) (2.5731, 712, -50.5616) (2.5731, 712, -46.4384) (2.5731, 712, 9.4384) (2.5731, 712, 13.5616)
sketch "Sketch8" plane through (6.0731, 40.99, 27.5) normal (1, 0, 0) x (0, 0, -1)
  line L0 (96, -40.99) -> (-4, -40.99) projected
  circle A0 centre (46, -40.99) radius 17
  line L1 (96, 671.01) -> (-4, 671.01) projected
  line L2 (29, -40.99) -> (63, -40.99)
  line L3 (63, -40.99) -> (63, 671.01)
  line L4 (63, 671.01) -> (29, 671.01)
  line L5 (29, 671.01) -> (29, -40.99)
  point P0 (27.5, -40.99)
  dimension "d51" = 34
extrude "Extrusion5" add sketch "Sketch8" against normal blind 10 contours A0 L5 L1 L3
properties part number "TopPaz" material "Алюминий 6061"
